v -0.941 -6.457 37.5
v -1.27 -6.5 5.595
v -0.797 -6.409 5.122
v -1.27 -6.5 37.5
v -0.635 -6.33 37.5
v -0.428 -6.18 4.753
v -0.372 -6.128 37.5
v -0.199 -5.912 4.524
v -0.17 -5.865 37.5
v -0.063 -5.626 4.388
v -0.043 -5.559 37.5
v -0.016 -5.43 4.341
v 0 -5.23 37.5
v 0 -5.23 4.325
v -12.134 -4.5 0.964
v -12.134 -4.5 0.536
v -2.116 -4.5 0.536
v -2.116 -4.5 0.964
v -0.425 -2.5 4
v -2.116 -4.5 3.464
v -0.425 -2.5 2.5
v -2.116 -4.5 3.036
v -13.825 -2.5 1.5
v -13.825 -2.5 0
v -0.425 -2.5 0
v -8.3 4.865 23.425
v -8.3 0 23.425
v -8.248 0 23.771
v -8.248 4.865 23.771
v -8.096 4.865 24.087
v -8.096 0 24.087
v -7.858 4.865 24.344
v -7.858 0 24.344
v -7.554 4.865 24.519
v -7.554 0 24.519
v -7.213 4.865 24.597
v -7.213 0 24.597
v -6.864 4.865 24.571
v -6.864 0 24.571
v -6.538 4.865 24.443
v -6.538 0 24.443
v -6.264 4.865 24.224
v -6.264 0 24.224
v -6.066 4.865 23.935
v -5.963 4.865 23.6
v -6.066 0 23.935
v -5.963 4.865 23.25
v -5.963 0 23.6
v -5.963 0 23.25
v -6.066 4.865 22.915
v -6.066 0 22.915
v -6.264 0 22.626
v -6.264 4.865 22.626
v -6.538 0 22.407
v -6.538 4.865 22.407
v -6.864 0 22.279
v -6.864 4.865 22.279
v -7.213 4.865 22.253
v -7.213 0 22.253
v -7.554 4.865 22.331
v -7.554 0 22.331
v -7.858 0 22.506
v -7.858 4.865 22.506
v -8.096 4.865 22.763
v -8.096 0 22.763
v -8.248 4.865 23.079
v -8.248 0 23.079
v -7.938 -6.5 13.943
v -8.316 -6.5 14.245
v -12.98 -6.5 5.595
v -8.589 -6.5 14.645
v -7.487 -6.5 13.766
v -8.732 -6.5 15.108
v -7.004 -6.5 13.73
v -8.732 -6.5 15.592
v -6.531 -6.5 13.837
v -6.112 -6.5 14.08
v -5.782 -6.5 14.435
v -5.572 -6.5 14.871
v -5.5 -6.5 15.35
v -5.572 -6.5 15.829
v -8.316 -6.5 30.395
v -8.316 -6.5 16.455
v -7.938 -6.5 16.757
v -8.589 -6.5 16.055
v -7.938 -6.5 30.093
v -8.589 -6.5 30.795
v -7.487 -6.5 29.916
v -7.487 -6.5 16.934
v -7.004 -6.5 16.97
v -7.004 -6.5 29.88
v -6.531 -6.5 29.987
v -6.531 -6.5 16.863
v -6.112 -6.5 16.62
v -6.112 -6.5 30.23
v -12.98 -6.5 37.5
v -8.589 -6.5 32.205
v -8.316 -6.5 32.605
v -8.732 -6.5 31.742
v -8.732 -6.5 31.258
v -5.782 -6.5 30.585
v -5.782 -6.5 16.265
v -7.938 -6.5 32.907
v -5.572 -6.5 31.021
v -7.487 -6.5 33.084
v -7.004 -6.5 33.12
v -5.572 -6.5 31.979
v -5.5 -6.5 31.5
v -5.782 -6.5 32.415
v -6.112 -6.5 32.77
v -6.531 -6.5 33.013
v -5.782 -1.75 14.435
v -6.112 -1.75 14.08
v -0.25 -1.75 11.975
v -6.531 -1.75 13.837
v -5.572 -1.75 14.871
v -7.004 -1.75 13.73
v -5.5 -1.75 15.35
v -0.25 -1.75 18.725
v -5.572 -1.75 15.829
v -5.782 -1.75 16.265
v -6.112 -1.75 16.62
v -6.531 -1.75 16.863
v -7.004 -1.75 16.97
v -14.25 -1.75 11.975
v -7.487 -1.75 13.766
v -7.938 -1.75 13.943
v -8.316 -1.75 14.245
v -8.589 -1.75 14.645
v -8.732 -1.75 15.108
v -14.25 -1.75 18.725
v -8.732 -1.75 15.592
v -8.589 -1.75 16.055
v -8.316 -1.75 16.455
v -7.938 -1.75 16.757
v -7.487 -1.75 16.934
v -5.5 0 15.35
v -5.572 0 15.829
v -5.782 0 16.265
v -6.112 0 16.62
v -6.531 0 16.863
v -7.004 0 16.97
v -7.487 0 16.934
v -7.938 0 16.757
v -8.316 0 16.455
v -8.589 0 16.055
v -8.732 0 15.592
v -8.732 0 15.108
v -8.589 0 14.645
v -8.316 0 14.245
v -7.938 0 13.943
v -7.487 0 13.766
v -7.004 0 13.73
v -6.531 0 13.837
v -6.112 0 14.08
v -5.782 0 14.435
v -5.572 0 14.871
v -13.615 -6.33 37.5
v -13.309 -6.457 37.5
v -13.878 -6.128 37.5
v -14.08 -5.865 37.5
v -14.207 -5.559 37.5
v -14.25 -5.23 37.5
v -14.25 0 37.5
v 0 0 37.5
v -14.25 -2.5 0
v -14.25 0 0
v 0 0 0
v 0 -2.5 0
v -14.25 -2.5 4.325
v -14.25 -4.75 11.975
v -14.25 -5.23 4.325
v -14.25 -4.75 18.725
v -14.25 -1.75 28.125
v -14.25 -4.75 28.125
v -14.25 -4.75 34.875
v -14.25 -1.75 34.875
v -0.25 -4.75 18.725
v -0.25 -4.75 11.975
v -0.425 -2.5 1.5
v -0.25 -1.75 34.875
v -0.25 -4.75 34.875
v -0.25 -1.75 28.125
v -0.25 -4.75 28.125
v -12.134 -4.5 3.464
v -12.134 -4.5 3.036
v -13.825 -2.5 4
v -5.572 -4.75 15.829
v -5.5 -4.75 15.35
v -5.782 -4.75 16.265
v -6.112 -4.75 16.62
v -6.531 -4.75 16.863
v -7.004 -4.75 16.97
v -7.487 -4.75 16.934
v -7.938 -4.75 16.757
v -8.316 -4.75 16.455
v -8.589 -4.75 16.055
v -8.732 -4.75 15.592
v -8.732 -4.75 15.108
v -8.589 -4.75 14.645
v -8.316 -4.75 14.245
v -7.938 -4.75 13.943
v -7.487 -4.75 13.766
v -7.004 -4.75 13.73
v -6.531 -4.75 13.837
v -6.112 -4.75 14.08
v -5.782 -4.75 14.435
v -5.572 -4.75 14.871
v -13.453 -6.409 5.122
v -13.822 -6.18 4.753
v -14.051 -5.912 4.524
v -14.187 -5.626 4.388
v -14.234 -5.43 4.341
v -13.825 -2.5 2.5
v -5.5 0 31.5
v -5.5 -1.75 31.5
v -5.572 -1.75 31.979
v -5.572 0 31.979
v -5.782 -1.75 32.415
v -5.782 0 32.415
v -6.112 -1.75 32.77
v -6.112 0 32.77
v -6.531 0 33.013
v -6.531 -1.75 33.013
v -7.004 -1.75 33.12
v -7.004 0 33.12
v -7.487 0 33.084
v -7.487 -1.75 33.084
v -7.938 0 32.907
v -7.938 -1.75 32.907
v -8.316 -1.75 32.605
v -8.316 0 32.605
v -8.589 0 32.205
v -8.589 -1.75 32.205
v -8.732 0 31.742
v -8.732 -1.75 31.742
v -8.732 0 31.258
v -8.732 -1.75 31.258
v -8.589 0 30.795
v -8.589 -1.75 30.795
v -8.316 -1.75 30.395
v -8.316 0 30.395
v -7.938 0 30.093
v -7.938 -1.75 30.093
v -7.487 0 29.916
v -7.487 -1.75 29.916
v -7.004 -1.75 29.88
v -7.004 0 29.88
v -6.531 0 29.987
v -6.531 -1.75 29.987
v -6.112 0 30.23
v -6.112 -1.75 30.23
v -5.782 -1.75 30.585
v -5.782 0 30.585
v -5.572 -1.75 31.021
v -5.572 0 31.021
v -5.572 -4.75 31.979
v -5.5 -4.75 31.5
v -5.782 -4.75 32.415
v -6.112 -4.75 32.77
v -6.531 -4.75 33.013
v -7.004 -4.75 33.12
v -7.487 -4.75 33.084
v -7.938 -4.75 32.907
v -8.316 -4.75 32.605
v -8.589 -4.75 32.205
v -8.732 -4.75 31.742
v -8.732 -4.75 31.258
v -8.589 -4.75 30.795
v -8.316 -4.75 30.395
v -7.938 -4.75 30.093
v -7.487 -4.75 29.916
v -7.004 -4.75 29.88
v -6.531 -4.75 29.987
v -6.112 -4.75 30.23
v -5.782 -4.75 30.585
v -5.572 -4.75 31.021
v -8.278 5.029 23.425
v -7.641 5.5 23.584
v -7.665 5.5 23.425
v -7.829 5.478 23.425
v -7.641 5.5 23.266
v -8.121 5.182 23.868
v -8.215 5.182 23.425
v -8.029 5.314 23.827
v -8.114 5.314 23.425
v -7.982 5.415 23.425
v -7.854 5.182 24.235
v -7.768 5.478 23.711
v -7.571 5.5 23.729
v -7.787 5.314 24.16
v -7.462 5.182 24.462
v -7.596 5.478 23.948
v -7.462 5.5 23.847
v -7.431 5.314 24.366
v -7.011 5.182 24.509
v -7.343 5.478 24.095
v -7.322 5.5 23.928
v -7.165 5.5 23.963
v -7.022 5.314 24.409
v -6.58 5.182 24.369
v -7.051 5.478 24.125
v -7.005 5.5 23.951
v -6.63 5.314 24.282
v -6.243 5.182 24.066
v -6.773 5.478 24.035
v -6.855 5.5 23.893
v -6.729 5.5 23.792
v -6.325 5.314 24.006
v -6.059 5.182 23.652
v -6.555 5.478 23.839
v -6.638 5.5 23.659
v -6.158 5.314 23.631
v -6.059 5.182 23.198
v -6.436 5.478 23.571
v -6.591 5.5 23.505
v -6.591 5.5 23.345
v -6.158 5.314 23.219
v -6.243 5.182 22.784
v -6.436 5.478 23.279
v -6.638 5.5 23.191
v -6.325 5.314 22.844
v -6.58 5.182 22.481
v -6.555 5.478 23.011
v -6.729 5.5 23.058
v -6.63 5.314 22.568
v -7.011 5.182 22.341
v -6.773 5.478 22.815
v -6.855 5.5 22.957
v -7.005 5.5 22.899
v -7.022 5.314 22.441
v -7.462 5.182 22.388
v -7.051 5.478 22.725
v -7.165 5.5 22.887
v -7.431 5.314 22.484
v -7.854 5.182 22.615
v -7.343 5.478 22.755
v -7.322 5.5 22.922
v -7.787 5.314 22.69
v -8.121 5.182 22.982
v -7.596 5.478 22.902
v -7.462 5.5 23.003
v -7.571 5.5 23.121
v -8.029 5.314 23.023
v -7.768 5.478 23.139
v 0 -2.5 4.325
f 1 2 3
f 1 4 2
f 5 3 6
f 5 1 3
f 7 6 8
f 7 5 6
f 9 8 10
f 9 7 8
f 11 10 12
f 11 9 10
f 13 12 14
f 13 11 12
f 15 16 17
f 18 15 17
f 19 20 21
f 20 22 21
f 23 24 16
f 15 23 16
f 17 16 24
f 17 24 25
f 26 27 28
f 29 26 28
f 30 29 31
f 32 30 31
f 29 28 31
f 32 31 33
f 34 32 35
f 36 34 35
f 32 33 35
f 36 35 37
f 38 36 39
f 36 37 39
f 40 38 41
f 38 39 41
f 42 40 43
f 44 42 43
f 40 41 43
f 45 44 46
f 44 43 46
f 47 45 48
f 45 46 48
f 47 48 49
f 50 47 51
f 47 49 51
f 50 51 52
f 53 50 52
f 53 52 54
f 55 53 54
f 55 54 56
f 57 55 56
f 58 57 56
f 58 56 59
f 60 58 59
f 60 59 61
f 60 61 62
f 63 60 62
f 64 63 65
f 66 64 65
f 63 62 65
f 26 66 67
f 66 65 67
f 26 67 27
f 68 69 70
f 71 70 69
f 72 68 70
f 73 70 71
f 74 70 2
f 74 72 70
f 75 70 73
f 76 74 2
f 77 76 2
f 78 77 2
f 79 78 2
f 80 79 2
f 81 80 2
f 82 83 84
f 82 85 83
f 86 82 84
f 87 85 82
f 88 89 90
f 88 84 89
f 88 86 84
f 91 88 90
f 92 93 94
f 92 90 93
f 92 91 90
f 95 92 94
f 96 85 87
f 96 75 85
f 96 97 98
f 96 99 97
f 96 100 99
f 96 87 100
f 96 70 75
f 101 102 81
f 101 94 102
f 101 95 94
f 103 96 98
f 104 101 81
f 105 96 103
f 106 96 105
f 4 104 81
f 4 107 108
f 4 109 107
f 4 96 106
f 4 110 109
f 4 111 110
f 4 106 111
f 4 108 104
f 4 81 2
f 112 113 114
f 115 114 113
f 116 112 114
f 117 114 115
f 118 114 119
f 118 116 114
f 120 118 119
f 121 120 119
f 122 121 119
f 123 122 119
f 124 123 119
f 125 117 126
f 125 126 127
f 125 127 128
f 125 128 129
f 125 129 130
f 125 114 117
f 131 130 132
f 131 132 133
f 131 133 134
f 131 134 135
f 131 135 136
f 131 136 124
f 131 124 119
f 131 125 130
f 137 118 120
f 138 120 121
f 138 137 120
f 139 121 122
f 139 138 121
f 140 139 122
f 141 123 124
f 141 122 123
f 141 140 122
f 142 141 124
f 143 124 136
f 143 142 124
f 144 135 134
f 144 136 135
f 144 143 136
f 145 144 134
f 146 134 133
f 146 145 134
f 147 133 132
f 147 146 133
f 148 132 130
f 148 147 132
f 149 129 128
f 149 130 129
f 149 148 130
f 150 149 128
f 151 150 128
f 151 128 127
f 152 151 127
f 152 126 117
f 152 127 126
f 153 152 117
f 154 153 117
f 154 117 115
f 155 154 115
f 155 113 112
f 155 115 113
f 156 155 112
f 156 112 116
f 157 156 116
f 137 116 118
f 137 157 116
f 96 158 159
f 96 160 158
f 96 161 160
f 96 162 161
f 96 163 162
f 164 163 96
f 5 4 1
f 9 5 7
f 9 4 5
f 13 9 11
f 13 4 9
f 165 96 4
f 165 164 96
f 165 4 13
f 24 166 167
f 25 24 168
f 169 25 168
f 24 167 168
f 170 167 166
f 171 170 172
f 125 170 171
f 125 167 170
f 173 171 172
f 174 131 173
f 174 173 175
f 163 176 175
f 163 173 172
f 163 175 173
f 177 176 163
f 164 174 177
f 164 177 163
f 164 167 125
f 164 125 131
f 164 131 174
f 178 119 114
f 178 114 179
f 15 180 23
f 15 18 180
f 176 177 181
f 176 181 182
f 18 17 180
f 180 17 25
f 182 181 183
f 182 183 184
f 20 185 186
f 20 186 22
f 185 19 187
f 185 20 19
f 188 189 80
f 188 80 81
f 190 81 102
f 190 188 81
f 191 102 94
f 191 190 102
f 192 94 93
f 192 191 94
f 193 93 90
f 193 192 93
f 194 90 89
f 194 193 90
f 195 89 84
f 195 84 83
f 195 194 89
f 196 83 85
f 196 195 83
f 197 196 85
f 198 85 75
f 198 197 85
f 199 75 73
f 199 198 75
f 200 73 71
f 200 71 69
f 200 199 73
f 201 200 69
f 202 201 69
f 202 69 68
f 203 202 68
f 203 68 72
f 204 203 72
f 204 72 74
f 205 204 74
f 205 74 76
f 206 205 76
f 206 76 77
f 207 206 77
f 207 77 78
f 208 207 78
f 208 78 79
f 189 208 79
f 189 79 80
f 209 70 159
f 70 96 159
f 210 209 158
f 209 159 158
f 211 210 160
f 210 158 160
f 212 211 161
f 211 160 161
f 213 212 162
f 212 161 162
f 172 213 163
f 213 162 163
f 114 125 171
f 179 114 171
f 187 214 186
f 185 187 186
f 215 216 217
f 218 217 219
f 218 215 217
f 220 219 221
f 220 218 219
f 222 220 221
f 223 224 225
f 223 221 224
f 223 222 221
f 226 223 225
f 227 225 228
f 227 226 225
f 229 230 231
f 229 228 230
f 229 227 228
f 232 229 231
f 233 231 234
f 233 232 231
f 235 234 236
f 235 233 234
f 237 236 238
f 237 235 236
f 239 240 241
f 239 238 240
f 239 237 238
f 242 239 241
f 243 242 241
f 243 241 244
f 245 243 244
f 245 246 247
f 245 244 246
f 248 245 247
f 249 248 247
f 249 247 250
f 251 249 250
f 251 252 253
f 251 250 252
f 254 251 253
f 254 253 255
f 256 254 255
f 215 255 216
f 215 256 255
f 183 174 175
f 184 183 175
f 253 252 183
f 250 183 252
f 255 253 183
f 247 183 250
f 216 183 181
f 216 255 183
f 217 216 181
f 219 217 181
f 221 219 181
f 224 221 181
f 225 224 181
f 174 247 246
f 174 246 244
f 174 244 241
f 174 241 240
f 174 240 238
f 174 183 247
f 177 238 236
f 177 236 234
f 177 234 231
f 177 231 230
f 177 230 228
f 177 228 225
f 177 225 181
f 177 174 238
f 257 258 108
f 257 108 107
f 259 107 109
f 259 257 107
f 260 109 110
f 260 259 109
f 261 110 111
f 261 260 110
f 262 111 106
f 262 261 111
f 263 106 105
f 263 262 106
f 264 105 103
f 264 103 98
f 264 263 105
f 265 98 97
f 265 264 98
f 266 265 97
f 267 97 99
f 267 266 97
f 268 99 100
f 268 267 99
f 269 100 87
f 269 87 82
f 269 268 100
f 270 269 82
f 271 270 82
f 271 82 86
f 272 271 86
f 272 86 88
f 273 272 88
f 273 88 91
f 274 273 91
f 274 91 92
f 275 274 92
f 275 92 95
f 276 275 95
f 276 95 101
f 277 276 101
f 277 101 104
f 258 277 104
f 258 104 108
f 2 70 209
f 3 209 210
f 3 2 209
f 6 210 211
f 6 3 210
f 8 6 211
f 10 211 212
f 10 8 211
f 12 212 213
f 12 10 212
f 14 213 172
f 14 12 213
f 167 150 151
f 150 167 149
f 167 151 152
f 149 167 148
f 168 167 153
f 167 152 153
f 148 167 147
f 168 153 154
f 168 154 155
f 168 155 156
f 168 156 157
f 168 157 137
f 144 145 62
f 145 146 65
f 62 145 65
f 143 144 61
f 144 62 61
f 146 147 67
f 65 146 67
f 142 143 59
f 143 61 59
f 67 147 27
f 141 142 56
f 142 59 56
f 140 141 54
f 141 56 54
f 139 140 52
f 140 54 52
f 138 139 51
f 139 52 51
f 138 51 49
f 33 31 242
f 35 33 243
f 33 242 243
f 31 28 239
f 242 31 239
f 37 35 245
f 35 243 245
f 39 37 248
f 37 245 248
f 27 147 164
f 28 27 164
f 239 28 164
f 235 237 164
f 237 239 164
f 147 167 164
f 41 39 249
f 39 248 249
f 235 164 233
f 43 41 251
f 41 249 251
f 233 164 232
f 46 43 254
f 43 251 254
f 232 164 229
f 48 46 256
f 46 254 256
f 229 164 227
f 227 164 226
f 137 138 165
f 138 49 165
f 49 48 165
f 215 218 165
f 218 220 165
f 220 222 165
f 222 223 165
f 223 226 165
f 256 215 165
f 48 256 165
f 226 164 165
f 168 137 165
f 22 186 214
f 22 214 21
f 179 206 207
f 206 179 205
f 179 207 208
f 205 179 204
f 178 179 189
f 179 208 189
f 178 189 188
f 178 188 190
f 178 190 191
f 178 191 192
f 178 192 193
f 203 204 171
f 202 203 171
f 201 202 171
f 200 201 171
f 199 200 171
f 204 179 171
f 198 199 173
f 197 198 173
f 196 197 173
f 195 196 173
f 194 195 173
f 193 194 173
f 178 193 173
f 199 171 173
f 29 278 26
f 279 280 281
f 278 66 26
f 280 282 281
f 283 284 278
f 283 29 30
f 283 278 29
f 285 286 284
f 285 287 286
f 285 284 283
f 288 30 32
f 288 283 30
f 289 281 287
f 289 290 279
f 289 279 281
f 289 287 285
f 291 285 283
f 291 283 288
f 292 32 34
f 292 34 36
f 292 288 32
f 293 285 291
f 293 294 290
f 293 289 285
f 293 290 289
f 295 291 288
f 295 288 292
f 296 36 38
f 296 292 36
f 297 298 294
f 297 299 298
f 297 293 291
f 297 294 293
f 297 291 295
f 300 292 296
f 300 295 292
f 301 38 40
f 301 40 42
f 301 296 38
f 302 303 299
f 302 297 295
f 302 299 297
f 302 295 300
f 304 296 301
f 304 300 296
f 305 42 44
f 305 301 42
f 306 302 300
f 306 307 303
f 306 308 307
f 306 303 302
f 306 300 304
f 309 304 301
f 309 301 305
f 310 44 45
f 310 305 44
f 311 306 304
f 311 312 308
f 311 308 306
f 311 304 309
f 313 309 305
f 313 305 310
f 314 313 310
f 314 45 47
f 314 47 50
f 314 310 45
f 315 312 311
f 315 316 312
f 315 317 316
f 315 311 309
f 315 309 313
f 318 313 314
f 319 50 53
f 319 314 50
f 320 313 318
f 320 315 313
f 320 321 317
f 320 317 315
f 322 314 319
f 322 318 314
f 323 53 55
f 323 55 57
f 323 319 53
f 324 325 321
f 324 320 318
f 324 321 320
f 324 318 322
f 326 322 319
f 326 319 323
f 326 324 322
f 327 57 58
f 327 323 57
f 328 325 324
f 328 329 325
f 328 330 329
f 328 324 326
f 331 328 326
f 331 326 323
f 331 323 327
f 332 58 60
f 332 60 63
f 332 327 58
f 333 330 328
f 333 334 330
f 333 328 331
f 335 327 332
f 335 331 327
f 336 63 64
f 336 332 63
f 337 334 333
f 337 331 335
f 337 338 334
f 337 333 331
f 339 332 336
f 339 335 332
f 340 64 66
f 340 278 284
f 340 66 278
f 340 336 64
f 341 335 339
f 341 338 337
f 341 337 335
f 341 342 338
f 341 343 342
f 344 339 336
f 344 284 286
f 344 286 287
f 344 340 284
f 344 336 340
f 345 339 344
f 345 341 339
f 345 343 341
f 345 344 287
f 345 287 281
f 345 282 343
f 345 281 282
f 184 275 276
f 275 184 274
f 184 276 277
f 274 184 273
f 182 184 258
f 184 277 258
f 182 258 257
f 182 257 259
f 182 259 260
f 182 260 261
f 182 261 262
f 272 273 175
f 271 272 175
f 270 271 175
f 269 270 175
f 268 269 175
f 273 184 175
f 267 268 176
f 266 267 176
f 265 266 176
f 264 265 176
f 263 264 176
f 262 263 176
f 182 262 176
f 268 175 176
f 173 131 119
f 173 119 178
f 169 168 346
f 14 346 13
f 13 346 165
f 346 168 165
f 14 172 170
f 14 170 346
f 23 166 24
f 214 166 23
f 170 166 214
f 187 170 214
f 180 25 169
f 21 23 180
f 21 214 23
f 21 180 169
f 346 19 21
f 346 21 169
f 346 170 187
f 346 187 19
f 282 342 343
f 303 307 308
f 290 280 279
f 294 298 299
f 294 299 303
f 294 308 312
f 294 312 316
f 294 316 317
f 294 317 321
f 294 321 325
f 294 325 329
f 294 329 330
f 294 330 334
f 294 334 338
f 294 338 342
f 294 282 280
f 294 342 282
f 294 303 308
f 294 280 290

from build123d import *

# Parameters (mm, degrees)
F0_W      = 14.25
F0_H      = 37.5
F0_R      = 1.625
F0_R_2    = 1.5
F1_DEPTH  = 6.5
F2_R      = 1.175
F3_DEPTH  = 5.5
F4_R      = 0.635
F5_W      = 3
F5_H      = 6.75
F6_DEPTH  = 14
F7_W      = 24.5
F7_H      = 4.325
F8_DEPTH  = 4
F9_W      = 13.4
F9_H      = 1.5
F10_DEPTH = 2
F10_TAPER = 15
F12_DEPTH = 4
F13_R     = 1.27


with BuildPart() as f1:
    # F0 (on Front) → F1 (new body)
    with BuildSketch(Plane.XZ):
        with Locations((-7.125, 18.75)):
            Rectangle(F0_W, F0_H)
        with Locations((-7.125, 15.35)):
            Circle(F0_R, mode=Mode.SUBTRACT)
        with Locations((-7.125, 23.425)):
            Circle(F0_R_2, mode=Mode.SUBTRACT)
        with Locations((-7.125, 31.5)):
            Circle(F0_R, mode=Mode.SUBTRACT)
        with Locations((-7.125, 23.425)):
            Circle(F0_R_2)
    extrude(amount=F1_DEPTH)

    # F2 (on face) → F3 (join)
    with BuildSketch(Plane(origin=(0, 0, 0), x_dir=(-1, 0, 0), z_dir=(0, 1, 0))):
        with Locations((7.125, 23.425)):
            Circle(F2_R)
    extrude(amount=F3_DEPTH)

    # F4
    f4_edges = [f1.edges().sort_by_distance(p)[0] for p in [
        (-5.95, 5.5, 23.425),
    ]]
    fillet(f4_edges, radius=F4_R)

    # F5 (on face) → F6 (cut)
    with BuildSketch(Plane(origin=(-14.25, 0, 0), x_dir=(0, -1, 0), z_dir=(-1, 0, 0))):
        with Locations((3.25, 31.5)):
            Rectangle(F5_W, F5_H)
        with Locations((3.25, 15.35)):
            Rectangle(F5_W, F5_H)
    extrude(amount=-F6_DEPTH, mode=Mode.SUBTRACT)

    # F7 (on face) → F8 (cut)
    with BuildSketch(Plane.XZ.offset(6.5)):
        with Locations((-7.125, 2.1625)):
            Rectangle(F7_W, F7_H)
    extrude(amount=-F8_DEPTH, mode=Mode.SUBTRACT)

    # F9 (on face) → F10 (join)
    with BuildSketch(Plane.XZ.offset(2.5)):
        with Locations((-7.125, 0.75)):
            Rectangle(F9_W, F9_H)
        with Locations((-7.125, 3.25)):
            Rectangle(F9_W, F9_H)
    extrude(amount=F10_DEPTH, taper=F10_TAPER)

    # F11 (on face) → F12 (cut)
    with BuildSketch(Plane(origin=(0, 0, 0), x_dir=(1, 0, 0), z_dir=(0, 0, -1))):
        Polygon((-14.25, 4.8693548888), (-14.25, 2.5), (-13.825, 2.5), (-12.125, 4.5109390723), (-2.125, 4.5109390723), (-0.425, 2.5), (0, 2.5), (0, 4.8693548888), align=None)
    extrude(amount=-F12_DEPTH, mode=Mode.SUBTRACT)

    # F13
    f13_edges = [f1.edges().sort_by_distance(p)[0] for p in [
        (-7.125, -6.5, 4.325),
        (-14.25, -6.5, 20.9125),
        (0, -6.5, 20.9125),
    ]]
    fillet(f13_edges, radius=F13_R)


solid = f1.part
